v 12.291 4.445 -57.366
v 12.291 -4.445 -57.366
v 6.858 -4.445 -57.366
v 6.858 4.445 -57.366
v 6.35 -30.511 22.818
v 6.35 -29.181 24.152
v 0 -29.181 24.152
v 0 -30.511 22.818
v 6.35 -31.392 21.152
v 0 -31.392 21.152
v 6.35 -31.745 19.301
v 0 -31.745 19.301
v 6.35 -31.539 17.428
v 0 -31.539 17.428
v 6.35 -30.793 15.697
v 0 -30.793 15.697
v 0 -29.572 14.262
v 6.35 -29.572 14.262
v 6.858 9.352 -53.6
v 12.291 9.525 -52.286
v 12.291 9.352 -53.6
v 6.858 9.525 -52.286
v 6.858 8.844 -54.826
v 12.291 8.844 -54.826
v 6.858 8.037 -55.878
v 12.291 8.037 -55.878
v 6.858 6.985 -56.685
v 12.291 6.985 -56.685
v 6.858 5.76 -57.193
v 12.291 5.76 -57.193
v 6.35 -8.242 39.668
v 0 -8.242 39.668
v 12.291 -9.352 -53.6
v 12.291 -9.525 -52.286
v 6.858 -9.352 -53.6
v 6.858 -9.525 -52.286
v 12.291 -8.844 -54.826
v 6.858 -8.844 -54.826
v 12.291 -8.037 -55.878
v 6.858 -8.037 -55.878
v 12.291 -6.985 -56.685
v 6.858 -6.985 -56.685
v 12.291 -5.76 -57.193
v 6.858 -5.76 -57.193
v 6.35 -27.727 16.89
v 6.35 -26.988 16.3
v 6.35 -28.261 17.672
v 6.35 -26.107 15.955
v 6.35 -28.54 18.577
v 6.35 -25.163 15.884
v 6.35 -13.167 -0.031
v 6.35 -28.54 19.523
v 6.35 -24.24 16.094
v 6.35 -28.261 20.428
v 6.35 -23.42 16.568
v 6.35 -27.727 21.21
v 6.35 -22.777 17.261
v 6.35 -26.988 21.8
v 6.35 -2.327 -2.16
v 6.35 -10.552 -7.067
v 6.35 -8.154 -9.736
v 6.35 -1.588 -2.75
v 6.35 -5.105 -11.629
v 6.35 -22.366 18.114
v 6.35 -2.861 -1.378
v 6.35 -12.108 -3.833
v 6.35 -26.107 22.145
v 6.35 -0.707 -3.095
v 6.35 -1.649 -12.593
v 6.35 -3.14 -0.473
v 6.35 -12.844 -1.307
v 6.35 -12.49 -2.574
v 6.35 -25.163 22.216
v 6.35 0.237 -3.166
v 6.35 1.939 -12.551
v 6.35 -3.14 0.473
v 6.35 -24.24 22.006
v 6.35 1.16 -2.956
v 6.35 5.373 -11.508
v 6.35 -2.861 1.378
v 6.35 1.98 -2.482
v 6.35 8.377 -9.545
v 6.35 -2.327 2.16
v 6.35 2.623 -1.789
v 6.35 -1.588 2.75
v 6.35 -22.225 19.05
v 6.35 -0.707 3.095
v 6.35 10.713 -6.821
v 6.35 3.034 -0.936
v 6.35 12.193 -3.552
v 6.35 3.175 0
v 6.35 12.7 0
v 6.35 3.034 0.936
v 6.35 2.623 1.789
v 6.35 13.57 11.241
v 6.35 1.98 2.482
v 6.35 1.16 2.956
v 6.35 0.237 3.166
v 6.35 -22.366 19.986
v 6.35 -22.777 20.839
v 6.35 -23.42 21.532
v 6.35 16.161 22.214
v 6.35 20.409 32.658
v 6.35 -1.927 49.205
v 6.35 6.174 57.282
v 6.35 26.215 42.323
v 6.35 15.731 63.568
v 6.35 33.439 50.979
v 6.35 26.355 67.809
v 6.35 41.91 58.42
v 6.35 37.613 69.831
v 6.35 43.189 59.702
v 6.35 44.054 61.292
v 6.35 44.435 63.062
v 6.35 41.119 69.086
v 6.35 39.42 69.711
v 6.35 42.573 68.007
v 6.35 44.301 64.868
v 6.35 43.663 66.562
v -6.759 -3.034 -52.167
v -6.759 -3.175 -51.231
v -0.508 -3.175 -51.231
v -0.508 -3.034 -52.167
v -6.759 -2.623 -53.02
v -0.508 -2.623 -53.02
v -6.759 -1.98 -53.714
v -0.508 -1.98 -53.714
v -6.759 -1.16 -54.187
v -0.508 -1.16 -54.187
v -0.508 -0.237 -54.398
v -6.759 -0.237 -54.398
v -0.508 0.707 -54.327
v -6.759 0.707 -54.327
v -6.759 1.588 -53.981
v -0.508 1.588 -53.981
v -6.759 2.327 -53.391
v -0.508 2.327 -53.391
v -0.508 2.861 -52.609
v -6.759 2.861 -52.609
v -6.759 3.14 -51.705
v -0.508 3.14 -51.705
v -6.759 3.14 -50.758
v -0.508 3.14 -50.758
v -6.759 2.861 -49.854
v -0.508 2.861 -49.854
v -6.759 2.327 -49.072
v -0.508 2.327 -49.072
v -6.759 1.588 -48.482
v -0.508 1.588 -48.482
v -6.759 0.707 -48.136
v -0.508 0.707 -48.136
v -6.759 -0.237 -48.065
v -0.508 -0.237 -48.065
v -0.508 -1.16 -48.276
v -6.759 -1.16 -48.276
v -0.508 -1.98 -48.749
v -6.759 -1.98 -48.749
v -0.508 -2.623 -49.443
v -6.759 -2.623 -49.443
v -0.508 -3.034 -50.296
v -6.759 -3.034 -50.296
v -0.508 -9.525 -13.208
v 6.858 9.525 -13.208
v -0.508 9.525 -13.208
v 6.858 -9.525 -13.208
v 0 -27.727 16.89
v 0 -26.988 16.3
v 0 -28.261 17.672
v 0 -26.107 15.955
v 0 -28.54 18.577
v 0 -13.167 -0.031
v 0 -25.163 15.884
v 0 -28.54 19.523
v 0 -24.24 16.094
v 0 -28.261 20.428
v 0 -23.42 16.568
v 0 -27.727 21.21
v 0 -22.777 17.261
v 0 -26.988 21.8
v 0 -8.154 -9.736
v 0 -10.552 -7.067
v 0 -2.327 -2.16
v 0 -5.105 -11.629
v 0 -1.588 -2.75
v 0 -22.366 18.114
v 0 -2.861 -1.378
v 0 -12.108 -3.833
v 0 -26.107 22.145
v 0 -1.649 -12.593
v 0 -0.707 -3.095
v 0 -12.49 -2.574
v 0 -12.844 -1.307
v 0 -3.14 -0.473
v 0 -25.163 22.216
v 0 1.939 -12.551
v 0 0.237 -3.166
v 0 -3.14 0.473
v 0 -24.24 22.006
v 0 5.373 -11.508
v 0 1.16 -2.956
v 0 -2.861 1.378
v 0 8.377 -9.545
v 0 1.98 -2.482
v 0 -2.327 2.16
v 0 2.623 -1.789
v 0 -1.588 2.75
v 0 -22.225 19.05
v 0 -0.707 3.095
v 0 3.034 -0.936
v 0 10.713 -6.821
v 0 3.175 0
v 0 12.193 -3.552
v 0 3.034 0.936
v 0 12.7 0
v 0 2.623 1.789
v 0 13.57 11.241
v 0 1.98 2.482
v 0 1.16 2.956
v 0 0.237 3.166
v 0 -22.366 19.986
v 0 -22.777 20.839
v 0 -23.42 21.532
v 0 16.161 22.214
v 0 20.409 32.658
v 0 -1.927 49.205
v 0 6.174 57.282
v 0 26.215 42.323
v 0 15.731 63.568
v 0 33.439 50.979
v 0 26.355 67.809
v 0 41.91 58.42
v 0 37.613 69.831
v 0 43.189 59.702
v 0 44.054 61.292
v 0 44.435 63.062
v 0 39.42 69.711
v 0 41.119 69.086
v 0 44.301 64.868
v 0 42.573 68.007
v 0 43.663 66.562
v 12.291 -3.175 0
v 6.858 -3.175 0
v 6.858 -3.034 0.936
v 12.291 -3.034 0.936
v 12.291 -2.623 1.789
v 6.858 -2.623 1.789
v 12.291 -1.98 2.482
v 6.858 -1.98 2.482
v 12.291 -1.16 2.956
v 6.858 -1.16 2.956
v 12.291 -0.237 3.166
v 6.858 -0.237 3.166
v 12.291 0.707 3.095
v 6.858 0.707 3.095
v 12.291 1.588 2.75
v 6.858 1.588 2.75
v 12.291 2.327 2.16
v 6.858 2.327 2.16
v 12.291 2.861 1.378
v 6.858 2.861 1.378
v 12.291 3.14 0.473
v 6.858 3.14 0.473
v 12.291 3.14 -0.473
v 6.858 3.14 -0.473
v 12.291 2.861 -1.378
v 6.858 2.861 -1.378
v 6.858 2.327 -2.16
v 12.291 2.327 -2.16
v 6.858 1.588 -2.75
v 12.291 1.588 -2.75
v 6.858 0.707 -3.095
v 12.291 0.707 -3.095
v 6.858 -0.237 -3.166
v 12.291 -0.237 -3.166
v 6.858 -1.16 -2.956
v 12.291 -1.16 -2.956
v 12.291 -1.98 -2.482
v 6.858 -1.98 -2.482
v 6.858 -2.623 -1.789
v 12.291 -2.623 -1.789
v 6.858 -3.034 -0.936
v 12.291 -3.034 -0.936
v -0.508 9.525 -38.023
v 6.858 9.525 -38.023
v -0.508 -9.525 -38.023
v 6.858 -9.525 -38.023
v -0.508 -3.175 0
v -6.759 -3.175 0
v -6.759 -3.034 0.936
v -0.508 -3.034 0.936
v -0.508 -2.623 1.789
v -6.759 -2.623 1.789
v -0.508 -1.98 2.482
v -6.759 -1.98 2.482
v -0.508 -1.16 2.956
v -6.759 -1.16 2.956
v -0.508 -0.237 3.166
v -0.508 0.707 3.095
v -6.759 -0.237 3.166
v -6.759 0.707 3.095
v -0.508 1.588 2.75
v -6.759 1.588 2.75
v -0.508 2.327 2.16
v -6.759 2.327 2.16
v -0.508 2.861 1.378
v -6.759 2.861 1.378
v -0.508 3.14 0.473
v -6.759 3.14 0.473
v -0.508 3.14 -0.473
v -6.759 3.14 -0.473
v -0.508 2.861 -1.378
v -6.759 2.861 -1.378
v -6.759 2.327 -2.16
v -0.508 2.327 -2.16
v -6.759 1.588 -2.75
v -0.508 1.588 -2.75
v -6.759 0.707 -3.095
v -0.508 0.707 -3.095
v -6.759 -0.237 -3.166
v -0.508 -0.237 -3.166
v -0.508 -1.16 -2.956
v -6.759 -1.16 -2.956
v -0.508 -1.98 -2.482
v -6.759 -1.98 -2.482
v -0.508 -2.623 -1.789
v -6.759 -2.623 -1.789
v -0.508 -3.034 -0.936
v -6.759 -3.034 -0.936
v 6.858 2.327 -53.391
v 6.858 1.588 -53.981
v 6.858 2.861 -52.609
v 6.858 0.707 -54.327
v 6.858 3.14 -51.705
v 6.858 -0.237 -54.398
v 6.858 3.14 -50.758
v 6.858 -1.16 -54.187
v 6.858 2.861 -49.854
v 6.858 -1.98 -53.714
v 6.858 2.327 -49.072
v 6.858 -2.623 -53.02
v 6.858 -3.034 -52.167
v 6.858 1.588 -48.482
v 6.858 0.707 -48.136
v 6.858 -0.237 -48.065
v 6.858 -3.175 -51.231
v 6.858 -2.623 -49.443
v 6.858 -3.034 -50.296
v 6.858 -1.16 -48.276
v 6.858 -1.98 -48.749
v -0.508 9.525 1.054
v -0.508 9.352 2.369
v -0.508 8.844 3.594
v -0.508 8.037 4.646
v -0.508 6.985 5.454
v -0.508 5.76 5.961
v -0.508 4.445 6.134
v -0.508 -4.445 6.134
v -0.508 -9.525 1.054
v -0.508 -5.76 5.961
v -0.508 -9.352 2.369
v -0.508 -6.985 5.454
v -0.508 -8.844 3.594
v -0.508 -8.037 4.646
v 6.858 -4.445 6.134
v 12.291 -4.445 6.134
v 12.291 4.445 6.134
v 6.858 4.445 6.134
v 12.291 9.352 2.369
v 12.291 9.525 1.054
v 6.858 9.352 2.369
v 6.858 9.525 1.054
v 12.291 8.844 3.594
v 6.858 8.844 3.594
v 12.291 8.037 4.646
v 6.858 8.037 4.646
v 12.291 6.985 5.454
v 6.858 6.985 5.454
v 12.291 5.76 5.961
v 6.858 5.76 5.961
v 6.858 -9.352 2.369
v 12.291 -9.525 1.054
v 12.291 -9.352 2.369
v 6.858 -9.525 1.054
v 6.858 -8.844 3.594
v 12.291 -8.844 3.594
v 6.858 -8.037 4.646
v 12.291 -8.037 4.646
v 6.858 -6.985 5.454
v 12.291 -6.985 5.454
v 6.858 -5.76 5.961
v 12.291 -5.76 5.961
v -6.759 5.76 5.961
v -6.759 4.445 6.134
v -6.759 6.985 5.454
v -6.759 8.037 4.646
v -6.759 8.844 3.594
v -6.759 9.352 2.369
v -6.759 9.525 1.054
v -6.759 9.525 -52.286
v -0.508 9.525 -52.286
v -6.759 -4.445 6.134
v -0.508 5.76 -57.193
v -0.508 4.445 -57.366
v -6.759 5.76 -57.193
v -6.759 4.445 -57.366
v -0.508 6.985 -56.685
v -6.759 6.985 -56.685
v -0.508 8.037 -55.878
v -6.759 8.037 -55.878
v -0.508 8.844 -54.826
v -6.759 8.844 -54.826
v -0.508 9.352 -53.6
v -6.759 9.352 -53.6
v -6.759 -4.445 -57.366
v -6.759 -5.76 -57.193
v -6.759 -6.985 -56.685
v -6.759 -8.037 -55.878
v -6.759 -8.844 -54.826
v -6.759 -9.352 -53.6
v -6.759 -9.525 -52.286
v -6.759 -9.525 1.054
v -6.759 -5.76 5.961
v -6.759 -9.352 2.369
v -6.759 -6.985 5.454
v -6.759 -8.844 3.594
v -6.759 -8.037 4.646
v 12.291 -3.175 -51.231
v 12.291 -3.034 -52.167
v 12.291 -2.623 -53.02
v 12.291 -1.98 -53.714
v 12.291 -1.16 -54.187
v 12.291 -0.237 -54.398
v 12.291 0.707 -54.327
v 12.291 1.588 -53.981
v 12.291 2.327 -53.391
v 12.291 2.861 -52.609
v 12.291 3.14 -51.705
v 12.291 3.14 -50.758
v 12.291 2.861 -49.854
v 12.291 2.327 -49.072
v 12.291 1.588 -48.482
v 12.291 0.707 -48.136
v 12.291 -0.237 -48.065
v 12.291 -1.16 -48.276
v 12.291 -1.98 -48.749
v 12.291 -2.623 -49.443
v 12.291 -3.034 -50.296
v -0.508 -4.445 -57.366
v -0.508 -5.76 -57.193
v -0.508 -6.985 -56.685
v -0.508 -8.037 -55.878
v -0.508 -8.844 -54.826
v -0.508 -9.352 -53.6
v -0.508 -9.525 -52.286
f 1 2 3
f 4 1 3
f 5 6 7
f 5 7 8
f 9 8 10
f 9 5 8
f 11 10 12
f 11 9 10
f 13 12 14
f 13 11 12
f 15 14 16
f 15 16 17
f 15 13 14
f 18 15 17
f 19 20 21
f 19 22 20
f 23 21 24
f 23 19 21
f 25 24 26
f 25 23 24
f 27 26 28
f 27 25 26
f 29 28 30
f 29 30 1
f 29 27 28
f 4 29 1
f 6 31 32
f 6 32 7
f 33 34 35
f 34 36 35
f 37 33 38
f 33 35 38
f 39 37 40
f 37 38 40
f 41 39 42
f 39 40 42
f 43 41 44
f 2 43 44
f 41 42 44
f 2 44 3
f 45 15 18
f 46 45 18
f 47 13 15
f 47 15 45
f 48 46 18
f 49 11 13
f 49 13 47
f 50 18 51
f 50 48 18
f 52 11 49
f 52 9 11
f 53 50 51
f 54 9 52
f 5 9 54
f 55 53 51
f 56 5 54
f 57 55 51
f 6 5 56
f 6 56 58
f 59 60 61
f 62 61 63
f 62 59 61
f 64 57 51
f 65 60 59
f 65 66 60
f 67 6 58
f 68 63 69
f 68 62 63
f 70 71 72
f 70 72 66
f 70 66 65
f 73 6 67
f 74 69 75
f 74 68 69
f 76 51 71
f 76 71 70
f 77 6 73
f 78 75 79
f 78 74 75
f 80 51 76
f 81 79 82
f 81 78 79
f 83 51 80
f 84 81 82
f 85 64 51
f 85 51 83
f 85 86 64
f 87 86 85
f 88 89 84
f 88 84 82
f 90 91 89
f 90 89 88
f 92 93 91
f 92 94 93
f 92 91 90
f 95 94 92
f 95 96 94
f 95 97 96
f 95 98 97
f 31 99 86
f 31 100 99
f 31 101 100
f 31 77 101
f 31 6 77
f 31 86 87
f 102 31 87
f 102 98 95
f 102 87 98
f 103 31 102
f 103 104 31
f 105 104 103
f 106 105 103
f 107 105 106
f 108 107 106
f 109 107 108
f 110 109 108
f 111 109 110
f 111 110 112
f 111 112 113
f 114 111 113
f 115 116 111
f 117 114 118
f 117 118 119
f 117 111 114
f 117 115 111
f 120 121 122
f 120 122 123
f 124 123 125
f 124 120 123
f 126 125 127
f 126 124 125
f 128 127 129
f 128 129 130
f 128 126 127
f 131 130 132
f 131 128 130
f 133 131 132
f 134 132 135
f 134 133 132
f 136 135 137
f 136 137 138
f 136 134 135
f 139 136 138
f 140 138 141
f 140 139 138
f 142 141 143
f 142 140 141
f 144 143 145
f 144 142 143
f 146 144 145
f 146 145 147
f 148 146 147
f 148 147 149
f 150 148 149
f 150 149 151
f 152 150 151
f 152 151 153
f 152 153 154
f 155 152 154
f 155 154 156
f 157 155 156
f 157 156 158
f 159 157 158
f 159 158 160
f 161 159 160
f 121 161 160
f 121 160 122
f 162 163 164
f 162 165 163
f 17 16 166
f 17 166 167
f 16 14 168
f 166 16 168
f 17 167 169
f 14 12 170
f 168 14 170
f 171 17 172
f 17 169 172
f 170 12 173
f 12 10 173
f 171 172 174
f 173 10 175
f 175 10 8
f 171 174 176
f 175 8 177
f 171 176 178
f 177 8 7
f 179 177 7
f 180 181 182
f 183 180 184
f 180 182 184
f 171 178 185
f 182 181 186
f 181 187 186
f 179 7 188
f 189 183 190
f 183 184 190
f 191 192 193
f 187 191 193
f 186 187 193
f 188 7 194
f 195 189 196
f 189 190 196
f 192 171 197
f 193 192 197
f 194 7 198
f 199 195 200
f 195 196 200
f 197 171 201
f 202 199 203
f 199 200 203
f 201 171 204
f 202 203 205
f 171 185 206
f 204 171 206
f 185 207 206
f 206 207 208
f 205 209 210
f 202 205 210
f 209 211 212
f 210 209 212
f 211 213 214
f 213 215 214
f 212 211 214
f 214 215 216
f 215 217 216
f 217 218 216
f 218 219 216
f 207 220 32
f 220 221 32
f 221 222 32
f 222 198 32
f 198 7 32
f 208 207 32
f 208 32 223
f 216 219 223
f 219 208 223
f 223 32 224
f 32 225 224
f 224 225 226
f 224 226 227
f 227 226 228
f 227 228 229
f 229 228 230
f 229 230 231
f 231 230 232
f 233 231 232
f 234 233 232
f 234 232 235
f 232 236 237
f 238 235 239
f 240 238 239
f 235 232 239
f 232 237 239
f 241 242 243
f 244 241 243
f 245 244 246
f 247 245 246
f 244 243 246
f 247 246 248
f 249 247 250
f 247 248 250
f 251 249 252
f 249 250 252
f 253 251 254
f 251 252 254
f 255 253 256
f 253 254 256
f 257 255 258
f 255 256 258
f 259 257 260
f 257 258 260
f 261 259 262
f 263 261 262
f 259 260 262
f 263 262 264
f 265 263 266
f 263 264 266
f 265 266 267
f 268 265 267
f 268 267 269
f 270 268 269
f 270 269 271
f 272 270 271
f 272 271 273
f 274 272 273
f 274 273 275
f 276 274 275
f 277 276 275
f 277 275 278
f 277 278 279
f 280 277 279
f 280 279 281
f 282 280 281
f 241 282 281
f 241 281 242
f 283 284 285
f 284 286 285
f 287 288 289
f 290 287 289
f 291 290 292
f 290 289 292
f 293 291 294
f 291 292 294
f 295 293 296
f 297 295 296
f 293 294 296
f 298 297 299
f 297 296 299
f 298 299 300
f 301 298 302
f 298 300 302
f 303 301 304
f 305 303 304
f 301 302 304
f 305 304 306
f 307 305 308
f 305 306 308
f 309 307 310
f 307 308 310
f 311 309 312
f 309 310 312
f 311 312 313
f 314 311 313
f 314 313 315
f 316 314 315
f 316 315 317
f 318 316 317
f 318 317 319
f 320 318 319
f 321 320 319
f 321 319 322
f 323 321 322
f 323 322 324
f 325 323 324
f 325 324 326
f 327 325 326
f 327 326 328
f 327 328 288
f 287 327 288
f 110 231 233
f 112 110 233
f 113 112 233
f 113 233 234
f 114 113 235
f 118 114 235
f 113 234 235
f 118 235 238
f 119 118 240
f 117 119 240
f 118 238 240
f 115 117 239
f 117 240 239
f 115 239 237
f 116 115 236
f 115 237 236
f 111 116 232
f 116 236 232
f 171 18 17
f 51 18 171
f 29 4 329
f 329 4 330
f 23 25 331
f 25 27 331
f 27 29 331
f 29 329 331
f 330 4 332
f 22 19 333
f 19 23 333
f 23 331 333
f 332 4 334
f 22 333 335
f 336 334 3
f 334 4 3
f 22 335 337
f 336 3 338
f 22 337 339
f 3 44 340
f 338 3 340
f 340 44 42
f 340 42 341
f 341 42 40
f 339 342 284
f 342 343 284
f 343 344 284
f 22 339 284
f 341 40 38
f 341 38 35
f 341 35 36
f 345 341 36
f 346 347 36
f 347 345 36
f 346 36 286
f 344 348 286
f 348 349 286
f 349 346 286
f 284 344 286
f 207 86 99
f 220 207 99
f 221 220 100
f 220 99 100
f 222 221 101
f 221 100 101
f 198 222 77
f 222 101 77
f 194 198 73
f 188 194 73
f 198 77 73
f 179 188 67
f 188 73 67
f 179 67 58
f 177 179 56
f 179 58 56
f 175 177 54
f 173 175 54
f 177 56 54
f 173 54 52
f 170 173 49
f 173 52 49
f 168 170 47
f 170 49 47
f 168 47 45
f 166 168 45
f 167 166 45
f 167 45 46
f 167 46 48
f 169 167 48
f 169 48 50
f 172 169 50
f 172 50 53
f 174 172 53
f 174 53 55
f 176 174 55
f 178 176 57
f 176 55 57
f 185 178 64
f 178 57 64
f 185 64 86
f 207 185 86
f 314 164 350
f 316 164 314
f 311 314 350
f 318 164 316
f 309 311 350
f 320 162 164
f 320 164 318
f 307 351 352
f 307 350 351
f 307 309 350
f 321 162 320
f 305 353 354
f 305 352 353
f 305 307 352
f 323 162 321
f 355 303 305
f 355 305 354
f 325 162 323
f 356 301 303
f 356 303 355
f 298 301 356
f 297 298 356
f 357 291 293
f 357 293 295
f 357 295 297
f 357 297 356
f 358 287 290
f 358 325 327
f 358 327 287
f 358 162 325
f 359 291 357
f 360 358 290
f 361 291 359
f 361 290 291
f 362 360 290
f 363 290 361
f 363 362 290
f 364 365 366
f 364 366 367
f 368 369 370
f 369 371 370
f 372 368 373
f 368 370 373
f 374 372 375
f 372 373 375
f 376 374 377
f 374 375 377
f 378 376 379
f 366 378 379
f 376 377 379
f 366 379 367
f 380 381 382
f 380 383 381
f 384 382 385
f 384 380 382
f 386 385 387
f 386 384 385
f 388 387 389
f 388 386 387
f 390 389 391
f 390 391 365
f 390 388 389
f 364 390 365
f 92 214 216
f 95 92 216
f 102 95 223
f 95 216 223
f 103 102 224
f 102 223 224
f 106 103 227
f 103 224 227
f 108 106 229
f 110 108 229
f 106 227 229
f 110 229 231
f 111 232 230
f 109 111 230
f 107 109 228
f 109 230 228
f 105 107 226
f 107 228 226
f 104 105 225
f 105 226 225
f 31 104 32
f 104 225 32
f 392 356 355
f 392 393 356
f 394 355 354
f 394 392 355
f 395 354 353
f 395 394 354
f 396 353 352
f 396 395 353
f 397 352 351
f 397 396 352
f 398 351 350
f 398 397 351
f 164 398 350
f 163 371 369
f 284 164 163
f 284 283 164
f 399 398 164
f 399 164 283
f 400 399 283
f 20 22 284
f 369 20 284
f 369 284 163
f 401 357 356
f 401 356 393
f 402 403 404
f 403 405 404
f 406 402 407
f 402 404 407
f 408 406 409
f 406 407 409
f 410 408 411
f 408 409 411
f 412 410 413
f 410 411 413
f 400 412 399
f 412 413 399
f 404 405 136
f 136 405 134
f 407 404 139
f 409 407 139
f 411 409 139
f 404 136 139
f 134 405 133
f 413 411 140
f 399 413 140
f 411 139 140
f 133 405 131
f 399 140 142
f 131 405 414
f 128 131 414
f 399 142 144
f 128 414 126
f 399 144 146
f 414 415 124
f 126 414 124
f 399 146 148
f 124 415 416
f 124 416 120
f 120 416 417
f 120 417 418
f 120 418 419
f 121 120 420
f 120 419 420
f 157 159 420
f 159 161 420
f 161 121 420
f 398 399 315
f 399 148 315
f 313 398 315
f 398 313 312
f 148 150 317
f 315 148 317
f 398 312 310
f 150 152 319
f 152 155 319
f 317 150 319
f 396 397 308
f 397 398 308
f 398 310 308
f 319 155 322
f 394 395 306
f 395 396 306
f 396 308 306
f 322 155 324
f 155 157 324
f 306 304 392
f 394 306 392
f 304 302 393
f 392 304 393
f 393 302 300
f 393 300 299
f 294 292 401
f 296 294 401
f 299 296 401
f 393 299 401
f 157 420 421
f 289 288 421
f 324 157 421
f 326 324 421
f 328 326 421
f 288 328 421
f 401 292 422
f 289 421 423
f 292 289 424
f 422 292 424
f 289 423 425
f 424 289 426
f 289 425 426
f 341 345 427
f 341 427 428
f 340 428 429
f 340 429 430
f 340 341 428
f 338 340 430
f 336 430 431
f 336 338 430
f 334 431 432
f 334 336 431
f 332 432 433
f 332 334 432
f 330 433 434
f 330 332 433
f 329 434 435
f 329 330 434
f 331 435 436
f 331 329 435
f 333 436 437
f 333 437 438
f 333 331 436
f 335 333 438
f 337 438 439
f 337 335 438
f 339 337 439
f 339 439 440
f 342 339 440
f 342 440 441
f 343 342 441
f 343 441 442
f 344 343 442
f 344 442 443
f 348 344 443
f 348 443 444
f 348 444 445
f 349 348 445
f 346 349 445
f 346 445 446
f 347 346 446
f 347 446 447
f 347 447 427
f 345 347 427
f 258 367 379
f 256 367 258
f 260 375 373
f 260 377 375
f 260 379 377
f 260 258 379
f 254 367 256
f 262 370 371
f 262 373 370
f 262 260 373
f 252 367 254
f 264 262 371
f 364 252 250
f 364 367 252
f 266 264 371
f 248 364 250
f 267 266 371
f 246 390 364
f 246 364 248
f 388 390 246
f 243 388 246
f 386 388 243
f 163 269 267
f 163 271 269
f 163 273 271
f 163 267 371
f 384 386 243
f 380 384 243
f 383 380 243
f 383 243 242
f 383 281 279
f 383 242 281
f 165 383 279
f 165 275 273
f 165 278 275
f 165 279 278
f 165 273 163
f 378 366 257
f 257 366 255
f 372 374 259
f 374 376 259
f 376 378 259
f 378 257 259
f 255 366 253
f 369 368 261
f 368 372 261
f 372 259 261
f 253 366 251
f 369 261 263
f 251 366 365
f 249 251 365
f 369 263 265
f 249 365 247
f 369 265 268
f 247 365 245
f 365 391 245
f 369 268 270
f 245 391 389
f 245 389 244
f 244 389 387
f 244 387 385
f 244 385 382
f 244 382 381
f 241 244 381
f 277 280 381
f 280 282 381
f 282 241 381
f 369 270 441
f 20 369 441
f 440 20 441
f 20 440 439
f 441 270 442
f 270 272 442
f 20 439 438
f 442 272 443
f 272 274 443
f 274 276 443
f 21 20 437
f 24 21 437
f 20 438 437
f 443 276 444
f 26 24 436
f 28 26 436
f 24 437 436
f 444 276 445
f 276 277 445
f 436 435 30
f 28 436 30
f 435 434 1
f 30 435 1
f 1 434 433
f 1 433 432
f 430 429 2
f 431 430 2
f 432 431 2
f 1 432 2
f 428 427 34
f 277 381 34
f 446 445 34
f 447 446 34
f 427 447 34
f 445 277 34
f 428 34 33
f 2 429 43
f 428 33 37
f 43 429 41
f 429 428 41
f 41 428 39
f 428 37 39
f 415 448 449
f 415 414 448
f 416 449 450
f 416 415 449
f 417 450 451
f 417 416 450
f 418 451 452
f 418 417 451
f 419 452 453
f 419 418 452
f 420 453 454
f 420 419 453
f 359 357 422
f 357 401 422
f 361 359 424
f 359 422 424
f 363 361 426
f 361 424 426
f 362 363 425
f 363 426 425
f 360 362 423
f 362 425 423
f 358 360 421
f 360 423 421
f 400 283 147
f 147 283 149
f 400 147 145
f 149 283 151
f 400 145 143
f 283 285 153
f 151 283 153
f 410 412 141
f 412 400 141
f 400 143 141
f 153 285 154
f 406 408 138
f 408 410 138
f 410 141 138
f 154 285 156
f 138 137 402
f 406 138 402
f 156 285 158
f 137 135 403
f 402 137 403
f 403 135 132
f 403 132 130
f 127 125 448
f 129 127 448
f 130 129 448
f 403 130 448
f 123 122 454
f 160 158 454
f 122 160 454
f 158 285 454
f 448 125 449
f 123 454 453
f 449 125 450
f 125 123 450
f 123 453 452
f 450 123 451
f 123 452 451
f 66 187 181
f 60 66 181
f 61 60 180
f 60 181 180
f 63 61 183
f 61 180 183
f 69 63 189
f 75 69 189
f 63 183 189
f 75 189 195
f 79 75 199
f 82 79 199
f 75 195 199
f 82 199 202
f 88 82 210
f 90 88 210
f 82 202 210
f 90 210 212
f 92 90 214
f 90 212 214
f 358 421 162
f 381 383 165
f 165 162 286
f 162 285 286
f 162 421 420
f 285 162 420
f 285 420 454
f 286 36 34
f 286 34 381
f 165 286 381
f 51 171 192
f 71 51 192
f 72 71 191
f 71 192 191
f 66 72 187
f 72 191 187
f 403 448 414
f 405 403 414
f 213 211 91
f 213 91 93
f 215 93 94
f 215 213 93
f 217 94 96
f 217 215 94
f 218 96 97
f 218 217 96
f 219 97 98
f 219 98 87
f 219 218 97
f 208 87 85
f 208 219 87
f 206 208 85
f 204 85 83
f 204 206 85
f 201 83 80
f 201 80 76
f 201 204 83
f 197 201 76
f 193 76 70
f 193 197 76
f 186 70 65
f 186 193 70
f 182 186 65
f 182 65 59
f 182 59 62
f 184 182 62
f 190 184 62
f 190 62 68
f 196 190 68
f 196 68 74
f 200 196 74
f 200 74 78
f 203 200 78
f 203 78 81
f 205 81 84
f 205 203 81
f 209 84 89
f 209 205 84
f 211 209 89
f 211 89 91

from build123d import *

# Parameters (mm, degrees)
F0_R     = 3.175
F1_DEPTH = 6.35
F2_R     = 3.175
F3_DEPTH = 6.35
F5_DEPTH = 9.525
F6_R     = 3.175
F7_DEPTH = 25.4
F8_R     = 5.08


with BuildPart() as f1:
    # F0 (on Right) → F1 (new body)
    with BuildSketch(Plane.YZ):
        with BuildLine():
            ThreePointArc((37.6131914897, 69.8313124606), (-5.0468372816, 45.0131316201), (-12.1077068408, -3.8332016718))
            ThreePointArc((-12.1077068408, -3.8332016718), (1.9393456527, -12.5510532801), (12.7, 0))
            ThreePointArc((12.7, 0), (20.4094543772, 32.6577728114), (41.91, 58.42))
            ThreePointArc((41.91, 58.42), (44.0426772955, 65.7376520199), (37.6131914897, 69.8313124606))
        make_face()
        Circle(F0_R, mode=Mode.SUBTRACT)
    extrude(amount=F1_DEPTH)

    # F2 (on face) → F3 (join)
    with BuildSketch(Plane.YZ.offset(6.35)):
        with BuildLine():
            Line((-8.242219049, 39.6678149022), (-29.1806365937, 24.1518905267))
            ThreePointArc((-29.1806365937, 24.1518905267), (-31.7450439502, 19.3008331522), (-29.5715862194, 14.2624778419))
            Line((-29.5715862194, 14.2624778419), (-13.1673026326, -0.0313219759))
            ThreePointArc((-13.1673026326, -0.0313219759), (-14.3212137772, 20.2669044036), (-8.242219049, 39.6678149022))
        make_face()
        with Locations((-25.4, 19.05)):
            Circle(F2_R, mode=Mode.SUBTRACT)
    extrude(amount=-F3_DEPTH)


with BuildPart() as f5:
    # F4 (on Front) → F5 (new body, symmetric)
    with BuildSketch(Plane.XZ):
        Polygon((-0.508, 6.1343043919), (-6.7594562411, 6.1343043919), (-6.7594562411, -25.6156956081), (12.2905437589, -25.6156956081), (12.2905437589, 6.1343043919), (6.858, 6.1343043919), (6.858, -13.208), (-0.508, -13.208), align=None)
    extrude(amount=F5_DEPTH, both=True)

    # F6 (on face) → F7 (cut)
    with BuildSketch(Plane(origin=(-6.7594562411, 0, 0), x_dir=(0, -1, 0), z_dir=(-1, 0, 0))):
        Circle(F6_R)
    extrude(amount=-F7_DEPTH, mode=Mode.SUBTRACT)

    # F8
    f8_edges = [f5.edges().sort_by_distance(p)[0] for p in [
        (-3.633728, -9.525, 6.134304),
        (-3.633728, 9.525, 6.134304),
        (9.574272, -9.525, 6.134304),
        (9.574272, 9.525, 6.134304),
    ]]
    fillet(f8_edges, radius=F8_R)

    # F9: F5 across face


with BuildPart() as f5_1:
    add(f5.part)
    add(f5.part.mirror(Plane(origin=(2.7655437589, 0, -25.6156956081), x_dir=(1, 0, 0), z_dir=(0, 0, -1))))


solid = Compound([f1.part, f5_1.part])
